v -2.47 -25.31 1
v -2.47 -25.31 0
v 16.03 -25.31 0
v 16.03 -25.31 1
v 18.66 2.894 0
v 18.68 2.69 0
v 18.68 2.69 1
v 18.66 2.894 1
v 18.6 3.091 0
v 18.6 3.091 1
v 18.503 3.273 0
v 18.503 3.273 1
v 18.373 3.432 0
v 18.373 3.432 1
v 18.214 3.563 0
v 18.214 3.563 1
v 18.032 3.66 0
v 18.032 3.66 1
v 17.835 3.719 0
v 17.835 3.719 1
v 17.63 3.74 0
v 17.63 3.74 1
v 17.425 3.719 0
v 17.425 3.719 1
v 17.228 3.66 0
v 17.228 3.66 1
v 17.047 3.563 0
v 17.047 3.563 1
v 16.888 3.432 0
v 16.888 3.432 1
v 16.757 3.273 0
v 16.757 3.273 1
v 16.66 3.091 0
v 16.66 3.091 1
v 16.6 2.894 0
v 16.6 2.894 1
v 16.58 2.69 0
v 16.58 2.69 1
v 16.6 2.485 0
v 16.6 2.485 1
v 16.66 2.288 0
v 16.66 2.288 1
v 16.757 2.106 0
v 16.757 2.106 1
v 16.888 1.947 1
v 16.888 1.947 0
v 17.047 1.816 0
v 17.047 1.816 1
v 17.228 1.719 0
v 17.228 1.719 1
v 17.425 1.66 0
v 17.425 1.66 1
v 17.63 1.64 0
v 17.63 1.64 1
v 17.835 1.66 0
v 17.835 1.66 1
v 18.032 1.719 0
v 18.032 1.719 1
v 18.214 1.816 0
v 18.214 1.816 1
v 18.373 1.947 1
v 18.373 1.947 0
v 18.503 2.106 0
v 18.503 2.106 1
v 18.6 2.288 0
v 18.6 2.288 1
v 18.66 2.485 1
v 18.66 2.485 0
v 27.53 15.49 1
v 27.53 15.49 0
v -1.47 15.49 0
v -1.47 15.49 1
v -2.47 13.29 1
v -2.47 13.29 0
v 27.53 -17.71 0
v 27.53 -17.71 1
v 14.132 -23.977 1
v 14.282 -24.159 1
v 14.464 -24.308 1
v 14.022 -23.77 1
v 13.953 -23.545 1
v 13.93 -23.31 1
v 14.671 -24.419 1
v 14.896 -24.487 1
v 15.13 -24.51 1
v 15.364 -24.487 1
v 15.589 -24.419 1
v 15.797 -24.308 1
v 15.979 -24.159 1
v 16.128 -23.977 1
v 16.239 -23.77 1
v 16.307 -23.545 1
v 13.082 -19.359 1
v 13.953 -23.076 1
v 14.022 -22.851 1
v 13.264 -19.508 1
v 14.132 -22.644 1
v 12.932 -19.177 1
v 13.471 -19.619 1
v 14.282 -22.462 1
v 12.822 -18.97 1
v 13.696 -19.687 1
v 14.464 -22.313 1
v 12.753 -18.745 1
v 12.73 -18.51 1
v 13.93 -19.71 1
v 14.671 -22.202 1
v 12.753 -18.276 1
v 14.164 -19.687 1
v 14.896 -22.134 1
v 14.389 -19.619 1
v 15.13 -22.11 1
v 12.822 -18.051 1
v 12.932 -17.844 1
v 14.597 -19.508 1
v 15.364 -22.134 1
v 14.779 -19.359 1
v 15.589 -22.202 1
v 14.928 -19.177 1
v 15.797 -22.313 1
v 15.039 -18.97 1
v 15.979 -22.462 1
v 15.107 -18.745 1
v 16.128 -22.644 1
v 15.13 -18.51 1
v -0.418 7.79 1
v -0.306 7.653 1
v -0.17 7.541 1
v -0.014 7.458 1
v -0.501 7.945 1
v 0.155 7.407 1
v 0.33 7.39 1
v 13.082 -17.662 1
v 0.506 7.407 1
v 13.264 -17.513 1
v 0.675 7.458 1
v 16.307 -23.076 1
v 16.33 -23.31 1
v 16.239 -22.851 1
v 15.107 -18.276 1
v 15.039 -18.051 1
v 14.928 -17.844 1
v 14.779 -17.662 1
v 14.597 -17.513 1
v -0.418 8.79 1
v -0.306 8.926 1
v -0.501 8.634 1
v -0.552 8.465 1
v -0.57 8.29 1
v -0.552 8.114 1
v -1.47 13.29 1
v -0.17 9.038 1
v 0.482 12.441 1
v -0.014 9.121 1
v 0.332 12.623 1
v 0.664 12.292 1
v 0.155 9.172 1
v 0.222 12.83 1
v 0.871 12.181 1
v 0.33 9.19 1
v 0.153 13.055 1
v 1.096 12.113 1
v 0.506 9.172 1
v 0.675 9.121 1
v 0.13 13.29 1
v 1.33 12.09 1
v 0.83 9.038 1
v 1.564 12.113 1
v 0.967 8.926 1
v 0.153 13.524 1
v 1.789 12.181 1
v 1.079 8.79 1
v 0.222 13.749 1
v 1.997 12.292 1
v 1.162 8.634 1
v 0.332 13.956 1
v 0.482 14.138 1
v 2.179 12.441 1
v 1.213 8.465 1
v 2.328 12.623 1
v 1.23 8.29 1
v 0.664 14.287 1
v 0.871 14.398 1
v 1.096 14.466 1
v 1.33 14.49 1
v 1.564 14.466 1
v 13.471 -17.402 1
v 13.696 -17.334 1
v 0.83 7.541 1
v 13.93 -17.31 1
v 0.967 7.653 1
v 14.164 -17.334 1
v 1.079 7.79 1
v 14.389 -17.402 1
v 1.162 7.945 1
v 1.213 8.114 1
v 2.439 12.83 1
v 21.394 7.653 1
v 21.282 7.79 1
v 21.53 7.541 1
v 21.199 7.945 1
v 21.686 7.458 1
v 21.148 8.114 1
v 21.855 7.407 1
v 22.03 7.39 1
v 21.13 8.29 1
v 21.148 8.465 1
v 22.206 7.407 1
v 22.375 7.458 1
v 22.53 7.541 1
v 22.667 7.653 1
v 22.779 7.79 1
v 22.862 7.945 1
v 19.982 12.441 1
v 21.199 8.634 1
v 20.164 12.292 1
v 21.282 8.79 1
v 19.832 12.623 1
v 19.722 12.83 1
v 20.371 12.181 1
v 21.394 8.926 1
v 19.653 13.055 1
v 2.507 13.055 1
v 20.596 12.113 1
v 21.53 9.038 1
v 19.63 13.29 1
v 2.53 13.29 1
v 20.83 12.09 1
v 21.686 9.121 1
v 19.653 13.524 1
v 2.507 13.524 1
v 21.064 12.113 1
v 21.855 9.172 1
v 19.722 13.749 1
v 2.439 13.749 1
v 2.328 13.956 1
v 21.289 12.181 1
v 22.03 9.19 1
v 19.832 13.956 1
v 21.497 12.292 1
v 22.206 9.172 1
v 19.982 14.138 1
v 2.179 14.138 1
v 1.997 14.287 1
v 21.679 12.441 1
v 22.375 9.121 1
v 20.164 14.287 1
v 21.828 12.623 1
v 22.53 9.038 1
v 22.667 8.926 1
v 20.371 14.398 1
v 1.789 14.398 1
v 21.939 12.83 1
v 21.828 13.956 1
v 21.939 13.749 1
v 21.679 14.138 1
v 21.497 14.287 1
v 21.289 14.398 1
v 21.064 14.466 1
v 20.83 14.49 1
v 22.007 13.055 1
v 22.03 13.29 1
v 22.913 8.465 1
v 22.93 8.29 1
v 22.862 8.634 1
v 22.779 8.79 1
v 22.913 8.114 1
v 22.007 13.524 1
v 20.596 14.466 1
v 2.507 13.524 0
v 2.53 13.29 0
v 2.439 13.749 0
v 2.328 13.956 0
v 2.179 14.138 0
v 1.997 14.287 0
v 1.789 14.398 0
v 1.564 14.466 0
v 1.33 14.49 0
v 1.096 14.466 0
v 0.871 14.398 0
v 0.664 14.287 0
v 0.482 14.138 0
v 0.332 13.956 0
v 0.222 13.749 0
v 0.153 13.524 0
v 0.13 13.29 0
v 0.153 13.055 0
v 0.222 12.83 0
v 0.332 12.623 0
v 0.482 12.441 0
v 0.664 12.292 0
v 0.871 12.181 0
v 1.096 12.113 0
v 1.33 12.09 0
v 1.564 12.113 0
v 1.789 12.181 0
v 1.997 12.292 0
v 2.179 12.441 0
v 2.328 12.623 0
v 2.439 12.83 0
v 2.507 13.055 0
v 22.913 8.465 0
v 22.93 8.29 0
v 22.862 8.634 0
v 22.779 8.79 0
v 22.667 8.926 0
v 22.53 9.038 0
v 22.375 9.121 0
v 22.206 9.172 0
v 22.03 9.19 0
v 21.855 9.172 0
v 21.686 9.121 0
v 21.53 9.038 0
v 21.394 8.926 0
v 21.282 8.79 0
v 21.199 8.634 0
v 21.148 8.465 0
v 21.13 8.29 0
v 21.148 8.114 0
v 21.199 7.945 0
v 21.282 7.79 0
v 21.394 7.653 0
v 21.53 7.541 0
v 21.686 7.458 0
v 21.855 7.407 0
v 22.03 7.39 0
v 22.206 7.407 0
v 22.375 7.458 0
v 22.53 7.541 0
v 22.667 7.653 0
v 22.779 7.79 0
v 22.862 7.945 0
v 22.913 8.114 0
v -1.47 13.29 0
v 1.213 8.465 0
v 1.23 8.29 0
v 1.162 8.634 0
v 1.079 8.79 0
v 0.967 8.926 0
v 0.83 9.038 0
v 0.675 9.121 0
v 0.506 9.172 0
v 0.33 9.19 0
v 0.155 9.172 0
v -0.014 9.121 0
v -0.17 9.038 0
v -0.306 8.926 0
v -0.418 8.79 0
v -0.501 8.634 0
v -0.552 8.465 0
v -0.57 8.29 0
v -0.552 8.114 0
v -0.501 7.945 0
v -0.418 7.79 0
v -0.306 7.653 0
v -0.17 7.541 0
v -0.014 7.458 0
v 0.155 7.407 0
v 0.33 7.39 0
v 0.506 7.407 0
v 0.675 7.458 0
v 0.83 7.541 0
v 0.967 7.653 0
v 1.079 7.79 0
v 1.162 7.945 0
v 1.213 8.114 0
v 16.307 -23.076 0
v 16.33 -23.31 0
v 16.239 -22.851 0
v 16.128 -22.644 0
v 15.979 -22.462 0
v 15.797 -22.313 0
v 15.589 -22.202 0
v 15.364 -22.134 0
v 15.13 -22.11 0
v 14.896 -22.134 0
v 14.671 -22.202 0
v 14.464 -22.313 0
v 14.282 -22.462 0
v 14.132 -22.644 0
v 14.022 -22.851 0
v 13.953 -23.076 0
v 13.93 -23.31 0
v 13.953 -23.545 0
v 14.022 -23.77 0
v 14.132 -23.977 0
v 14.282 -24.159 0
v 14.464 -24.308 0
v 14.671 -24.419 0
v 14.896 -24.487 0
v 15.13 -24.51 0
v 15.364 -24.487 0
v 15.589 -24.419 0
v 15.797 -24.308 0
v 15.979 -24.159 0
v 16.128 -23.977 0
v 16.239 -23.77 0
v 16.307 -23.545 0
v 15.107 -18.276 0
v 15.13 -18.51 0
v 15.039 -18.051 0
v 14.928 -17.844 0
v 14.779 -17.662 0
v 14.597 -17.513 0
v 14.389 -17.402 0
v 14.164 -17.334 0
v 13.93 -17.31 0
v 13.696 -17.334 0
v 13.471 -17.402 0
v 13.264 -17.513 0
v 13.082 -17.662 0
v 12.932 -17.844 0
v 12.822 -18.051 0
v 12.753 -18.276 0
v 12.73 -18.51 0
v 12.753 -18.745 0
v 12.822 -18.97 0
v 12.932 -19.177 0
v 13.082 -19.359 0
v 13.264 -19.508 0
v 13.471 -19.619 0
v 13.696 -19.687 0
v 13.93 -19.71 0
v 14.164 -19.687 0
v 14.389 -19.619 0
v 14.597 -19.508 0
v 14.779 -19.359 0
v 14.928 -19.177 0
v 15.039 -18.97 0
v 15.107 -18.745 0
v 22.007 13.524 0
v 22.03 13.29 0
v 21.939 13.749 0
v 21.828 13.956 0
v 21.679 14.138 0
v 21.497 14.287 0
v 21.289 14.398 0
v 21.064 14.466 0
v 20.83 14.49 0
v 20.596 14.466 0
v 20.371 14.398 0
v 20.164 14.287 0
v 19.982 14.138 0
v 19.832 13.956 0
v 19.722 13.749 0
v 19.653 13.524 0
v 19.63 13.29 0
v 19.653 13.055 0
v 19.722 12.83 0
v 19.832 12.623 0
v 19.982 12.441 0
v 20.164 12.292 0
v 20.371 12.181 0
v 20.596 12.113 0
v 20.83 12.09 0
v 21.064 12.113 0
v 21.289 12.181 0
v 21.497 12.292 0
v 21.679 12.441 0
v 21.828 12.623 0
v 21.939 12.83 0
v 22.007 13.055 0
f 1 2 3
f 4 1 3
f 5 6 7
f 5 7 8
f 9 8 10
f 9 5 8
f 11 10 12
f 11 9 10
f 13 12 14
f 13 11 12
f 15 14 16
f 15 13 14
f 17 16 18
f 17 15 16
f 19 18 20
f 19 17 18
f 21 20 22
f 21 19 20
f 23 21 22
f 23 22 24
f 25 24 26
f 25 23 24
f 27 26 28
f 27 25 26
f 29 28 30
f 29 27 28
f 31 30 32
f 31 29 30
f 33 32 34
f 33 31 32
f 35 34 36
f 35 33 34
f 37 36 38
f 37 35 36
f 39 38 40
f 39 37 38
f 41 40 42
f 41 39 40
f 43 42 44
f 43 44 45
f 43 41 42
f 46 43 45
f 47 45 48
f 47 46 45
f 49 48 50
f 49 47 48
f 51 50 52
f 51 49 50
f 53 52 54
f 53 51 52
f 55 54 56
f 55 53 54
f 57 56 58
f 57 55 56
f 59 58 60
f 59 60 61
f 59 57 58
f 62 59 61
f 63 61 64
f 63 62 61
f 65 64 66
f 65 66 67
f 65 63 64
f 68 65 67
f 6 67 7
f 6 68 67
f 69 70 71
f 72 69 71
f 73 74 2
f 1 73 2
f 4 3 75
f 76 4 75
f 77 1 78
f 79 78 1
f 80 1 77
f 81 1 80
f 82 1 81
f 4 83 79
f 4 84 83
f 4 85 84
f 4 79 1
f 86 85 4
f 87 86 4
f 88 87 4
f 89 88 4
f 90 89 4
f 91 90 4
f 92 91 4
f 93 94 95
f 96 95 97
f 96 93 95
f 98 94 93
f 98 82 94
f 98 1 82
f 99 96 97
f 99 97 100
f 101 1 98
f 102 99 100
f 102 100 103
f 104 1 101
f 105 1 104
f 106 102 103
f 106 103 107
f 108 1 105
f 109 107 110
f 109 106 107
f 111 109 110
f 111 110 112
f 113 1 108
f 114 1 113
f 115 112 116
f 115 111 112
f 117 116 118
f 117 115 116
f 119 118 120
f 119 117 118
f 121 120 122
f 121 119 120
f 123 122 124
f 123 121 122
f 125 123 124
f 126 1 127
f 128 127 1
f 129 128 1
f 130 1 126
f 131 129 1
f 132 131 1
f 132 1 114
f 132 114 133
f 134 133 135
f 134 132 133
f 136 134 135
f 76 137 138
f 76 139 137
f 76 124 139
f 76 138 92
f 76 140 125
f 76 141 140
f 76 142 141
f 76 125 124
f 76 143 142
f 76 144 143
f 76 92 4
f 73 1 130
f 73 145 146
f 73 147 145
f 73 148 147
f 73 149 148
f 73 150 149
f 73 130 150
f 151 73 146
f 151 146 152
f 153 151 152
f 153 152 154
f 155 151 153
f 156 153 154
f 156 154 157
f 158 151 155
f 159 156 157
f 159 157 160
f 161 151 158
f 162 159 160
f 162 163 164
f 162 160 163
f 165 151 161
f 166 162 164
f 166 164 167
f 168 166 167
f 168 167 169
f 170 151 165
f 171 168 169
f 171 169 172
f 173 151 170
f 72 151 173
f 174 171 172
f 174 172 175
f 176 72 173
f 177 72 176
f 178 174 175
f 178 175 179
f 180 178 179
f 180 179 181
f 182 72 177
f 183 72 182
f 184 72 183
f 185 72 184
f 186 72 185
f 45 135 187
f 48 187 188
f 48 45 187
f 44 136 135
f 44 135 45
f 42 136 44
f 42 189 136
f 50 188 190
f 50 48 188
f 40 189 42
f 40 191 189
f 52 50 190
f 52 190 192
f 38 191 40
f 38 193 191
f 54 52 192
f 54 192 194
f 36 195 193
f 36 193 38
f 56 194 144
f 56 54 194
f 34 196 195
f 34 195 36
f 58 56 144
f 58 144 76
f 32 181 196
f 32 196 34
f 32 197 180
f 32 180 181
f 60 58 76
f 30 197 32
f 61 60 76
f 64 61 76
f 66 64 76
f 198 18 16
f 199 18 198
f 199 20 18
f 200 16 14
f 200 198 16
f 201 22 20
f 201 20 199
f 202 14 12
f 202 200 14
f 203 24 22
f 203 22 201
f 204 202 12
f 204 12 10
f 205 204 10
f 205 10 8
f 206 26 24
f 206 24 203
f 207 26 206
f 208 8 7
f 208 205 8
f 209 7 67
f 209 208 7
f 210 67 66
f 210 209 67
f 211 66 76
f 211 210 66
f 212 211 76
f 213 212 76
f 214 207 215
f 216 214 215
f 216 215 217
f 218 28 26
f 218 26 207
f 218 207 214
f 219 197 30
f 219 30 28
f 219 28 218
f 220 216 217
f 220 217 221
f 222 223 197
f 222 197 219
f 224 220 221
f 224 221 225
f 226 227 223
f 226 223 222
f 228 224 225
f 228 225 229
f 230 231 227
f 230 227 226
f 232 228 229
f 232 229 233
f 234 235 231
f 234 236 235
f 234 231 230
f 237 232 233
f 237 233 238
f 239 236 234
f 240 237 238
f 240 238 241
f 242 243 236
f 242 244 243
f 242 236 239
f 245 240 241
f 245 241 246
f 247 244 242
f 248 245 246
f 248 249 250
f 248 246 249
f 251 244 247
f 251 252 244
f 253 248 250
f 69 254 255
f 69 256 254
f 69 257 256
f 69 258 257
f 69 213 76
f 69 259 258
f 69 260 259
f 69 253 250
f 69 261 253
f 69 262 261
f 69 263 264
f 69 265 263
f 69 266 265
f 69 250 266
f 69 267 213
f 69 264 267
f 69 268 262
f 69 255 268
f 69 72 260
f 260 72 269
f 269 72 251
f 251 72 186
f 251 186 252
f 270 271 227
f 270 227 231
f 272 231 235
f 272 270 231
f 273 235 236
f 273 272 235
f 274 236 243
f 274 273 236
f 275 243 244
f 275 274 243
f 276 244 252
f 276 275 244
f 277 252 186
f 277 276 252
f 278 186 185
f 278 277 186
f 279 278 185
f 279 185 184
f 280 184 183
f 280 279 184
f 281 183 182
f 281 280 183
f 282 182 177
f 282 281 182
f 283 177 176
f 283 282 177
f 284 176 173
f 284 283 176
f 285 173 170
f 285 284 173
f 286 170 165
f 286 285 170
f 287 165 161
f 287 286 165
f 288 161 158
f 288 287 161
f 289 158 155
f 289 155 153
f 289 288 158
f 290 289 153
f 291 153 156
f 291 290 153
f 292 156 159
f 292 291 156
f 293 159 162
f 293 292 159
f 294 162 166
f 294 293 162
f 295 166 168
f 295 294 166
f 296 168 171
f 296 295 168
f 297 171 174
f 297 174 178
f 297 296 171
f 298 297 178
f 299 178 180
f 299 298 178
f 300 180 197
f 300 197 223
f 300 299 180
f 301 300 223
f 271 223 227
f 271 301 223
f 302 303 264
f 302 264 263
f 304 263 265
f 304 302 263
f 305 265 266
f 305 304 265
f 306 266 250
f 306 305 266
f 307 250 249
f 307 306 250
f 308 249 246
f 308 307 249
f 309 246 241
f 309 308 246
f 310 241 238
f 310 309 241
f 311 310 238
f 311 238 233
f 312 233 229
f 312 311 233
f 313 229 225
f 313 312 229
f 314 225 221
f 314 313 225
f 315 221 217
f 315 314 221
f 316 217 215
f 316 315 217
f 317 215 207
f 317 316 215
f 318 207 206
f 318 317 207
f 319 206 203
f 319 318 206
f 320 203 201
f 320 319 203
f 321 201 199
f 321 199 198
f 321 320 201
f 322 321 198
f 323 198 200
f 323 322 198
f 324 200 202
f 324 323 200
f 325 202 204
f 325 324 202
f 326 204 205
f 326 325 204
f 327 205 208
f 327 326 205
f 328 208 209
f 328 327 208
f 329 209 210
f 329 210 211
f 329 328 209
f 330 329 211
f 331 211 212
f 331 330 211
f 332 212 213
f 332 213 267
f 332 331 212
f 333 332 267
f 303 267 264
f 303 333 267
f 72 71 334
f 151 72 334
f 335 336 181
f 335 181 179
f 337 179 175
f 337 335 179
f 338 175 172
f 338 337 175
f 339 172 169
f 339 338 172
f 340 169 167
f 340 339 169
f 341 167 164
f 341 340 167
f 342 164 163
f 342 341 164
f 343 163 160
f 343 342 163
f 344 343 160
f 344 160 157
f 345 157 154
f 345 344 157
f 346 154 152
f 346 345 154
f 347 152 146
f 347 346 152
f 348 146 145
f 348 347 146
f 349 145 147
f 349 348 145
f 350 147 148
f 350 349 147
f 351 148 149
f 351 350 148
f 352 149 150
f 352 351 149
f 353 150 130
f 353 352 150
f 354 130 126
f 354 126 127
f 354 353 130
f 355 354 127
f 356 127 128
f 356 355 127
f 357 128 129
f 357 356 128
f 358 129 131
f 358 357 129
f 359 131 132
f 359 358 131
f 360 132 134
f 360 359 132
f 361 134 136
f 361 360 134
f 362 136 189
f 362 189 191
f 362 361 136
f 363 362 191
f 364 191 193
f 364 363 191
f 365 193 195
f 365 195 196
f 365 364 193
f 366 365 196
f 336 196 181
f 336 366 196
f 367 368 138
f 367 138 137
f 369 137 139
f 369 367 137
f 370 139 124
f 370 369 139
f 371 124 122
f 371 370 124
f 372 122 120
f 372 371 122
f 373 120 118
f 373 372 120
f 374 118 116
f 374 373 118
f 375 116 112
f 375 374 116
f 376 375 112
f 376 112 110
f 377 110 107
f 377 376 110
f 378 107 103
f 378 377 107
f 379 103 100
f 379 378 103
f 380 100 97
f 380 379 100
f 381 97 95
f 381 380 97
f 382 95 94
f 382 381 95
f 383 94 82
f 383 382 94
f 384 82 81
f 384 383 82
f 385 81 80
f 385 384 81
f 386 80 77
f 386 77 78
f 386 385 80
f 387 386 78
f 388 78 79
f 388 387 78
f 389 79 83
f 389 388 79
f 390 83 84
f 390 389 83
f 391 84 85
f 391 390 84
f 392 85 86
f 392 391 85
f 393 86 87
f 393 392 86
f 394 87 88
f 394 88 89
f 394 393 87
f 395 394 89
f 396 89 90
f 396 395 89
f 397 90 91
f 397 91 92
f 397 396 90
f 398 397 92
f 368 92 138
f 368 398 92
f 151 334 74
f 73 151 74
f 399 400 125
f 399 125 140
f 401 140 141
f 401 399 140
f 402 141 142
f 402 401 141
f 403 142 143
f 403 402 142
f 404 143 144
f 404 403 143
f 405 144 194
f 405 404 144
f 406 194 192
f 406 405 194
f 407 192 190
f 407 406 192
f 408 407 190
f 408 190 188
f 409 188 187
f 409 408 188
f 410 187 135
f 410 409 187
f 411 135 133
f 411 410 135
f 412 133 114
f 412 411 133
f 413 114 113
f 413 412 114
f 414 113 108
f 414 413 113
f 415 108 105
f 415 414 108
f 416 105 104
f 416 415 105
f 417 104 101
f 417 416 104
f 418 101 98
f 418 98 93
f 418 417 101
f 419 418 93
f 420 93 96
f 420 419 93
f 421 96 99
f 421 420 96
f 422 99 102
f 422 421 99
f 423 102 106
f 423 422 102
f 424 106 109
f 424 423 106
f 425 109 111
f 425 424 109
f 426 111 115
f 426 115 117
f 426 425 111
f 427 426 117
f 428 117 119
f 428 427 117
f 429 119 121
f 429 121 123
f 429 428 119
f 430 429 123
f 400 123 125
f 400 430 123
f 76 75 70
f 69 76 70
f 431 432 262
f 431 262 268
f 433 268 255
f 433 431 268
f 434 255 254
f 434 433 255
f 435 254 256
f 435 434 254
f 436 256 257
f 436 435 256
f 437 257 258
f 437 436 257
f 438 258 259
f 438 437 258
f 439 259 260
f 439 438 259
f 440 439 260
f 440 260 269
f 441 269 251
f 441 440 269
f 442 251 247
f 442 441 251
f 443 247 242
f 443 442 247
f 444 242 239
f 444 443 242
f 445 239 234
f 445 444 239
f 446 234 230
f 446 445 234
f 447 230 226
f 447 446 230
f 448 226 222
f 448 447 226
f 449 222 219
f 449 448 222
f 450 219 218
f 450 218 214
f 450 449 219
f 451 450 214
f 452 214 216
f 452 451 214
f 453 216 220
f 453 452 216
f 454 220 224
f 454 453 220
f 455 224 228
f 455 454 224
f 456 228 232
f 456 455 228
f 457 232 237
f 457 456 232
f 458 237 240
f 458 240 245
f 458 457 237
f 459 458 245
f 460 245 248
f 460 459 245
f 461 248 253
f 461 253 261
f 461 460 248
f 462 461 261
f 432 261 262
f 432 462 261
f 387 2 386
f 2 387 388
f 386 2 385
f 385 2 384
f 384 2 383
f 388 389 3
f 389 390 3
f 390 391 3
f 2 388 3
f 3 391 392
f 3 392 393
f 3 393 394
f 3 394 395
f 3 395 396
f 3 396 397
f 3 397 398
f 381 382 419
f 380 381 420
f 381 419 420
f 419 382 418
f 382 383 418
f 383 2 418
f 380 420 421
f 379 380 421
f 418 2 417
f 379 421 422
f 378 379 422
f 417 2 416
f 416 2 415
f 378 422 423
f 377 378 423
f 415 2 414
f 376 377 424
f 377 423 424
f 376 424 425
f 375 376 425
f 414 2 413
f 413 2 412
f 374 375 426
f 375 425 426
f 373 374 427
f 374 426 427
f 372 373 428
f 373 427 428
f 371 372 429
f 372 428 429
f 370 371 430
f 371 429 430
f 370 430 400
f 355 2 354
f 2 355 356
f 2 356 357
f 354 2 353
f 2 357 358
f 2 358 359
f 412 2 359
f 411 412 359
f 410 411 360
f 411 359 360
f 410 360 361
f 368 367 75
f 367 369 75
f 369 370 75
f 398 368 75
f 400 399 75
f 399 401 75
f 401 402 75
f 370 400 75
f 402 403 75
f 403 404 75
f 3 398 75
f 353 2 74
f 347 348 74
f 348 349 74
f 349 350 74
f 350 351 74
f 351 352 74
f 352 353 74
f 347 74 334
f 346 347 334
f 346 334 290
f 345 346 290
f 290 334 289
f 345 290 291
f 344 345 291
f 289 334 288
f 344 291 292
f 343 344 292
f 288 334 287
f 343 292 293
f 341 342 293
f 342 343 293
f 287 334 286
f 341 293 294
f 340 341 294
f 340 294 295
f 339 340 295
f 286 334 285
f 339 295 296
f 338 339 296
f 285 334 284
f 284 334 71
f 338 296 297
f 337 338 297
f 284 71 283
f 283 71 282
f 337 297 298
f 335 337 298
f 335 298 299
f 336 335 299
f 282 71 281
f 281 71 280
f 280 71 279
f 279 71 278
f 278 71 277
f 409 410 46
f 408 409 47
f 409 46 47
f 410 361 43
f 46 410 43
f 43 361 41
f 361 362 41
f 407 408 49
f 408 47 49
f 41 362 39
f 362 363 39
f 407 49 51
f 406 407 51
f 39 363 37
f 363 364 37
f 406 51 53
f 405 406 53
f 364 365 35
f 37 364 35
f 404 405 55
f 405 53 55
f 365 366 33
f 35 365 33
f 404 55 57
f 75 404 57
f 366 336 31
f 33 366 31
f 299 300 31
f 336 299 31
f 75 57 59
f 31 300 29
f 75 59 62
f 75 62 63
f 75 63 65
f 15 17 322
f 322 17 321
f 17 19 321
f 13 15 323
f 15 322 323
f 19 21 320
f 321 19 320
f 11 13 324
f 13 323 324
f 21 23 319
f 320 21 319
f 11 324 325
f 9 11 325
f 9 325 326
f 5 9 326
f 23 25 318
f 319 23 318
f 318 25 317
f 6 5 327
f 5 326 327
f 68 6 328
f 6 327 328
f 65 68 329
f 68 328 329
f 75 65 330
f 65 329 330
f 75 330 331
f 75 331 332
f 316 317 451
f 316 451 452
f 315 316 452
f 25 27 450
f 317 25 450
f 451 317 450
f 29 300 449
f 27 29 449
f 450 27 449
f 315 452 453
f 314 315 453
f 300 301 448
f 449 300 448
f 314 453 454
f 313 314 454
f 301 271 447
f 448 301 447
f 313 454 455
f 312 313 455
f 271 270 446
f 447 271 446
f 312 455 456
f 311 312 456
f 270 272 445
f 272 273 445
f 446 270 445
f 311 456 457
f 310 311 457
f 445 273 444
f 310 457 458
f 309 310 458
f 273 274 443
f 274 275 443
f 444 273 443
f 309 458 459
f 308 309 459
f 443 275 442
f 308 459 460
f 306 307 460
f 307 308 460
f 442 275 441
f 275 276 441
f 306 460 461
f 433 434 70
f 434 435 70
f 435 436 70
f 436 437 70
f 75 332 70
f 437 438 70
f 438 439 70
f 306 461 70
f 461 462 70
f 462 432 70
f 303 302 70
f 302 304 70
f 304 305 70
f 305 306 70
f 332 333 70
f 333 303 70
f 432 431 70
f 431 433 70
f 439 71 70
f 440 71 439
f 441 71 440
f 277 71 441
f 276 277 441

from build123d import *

# Parameters (mm, degrees)
F0_R     = 1.2
F0_R_2   = 0.9
F0_R_3   = 1.05
F1_DEPTH = 1


# Not quite as in the source:
# - a feature of the source that left no trace in its solid (it failed there, or was rolled back) is left out


with BuildPart() as f1:
    # F0 (on Top) → F1 (new body)
    with BuildSketch(Plane.XY):
        Polygon((27.5302478731, -17.7104764104), (27.5302478731, 15.4895235896), (-1.4697521269, 15.4895235896), (-1.4697521269, 13.2895235896), (-2.4697521269, 13.2895235896), (-2.4697521269, -22.3104764104), (-2.4697521269, -25.3104764104), (-1.4697521269, -25.3104764104), (16.0302478731, -25.3104764104), align=None)
        with Locations((15.1302478731, -23.3104764104)):
            Circle(F0_R, mode=Mode.SUBTRACT)
        with Locations((13.9302478731, -18.5104764104)):
            Circle(F0_R, mode=Mode.SUBTRACT)
        with Locations((0.3302478731, 8.2895235896)):
            Circle(F0_R_2, mode=Mode.SUBTRACT)
        with Locations((1.3302478731, 13.2895235896)):
            Circle(F0_R, mode=Mode.SUBTRACT)
        with Locations((17.6302478731, 2.6895235896)):
            Circle(F0_R_3, mode=Mode.SUBTRACT)
        with Locations((22.0302478731, 8.2895235896)):
            Circle(F0_R_2, mode=Mode.SUBTRACT)
        with Locations((20.8302478731, 13.2895235896)):
            Circle(F0_R, mode=Mode.SUBTRACT)
    extrude(amount=F1_DEPTH)


solid = f1.part
